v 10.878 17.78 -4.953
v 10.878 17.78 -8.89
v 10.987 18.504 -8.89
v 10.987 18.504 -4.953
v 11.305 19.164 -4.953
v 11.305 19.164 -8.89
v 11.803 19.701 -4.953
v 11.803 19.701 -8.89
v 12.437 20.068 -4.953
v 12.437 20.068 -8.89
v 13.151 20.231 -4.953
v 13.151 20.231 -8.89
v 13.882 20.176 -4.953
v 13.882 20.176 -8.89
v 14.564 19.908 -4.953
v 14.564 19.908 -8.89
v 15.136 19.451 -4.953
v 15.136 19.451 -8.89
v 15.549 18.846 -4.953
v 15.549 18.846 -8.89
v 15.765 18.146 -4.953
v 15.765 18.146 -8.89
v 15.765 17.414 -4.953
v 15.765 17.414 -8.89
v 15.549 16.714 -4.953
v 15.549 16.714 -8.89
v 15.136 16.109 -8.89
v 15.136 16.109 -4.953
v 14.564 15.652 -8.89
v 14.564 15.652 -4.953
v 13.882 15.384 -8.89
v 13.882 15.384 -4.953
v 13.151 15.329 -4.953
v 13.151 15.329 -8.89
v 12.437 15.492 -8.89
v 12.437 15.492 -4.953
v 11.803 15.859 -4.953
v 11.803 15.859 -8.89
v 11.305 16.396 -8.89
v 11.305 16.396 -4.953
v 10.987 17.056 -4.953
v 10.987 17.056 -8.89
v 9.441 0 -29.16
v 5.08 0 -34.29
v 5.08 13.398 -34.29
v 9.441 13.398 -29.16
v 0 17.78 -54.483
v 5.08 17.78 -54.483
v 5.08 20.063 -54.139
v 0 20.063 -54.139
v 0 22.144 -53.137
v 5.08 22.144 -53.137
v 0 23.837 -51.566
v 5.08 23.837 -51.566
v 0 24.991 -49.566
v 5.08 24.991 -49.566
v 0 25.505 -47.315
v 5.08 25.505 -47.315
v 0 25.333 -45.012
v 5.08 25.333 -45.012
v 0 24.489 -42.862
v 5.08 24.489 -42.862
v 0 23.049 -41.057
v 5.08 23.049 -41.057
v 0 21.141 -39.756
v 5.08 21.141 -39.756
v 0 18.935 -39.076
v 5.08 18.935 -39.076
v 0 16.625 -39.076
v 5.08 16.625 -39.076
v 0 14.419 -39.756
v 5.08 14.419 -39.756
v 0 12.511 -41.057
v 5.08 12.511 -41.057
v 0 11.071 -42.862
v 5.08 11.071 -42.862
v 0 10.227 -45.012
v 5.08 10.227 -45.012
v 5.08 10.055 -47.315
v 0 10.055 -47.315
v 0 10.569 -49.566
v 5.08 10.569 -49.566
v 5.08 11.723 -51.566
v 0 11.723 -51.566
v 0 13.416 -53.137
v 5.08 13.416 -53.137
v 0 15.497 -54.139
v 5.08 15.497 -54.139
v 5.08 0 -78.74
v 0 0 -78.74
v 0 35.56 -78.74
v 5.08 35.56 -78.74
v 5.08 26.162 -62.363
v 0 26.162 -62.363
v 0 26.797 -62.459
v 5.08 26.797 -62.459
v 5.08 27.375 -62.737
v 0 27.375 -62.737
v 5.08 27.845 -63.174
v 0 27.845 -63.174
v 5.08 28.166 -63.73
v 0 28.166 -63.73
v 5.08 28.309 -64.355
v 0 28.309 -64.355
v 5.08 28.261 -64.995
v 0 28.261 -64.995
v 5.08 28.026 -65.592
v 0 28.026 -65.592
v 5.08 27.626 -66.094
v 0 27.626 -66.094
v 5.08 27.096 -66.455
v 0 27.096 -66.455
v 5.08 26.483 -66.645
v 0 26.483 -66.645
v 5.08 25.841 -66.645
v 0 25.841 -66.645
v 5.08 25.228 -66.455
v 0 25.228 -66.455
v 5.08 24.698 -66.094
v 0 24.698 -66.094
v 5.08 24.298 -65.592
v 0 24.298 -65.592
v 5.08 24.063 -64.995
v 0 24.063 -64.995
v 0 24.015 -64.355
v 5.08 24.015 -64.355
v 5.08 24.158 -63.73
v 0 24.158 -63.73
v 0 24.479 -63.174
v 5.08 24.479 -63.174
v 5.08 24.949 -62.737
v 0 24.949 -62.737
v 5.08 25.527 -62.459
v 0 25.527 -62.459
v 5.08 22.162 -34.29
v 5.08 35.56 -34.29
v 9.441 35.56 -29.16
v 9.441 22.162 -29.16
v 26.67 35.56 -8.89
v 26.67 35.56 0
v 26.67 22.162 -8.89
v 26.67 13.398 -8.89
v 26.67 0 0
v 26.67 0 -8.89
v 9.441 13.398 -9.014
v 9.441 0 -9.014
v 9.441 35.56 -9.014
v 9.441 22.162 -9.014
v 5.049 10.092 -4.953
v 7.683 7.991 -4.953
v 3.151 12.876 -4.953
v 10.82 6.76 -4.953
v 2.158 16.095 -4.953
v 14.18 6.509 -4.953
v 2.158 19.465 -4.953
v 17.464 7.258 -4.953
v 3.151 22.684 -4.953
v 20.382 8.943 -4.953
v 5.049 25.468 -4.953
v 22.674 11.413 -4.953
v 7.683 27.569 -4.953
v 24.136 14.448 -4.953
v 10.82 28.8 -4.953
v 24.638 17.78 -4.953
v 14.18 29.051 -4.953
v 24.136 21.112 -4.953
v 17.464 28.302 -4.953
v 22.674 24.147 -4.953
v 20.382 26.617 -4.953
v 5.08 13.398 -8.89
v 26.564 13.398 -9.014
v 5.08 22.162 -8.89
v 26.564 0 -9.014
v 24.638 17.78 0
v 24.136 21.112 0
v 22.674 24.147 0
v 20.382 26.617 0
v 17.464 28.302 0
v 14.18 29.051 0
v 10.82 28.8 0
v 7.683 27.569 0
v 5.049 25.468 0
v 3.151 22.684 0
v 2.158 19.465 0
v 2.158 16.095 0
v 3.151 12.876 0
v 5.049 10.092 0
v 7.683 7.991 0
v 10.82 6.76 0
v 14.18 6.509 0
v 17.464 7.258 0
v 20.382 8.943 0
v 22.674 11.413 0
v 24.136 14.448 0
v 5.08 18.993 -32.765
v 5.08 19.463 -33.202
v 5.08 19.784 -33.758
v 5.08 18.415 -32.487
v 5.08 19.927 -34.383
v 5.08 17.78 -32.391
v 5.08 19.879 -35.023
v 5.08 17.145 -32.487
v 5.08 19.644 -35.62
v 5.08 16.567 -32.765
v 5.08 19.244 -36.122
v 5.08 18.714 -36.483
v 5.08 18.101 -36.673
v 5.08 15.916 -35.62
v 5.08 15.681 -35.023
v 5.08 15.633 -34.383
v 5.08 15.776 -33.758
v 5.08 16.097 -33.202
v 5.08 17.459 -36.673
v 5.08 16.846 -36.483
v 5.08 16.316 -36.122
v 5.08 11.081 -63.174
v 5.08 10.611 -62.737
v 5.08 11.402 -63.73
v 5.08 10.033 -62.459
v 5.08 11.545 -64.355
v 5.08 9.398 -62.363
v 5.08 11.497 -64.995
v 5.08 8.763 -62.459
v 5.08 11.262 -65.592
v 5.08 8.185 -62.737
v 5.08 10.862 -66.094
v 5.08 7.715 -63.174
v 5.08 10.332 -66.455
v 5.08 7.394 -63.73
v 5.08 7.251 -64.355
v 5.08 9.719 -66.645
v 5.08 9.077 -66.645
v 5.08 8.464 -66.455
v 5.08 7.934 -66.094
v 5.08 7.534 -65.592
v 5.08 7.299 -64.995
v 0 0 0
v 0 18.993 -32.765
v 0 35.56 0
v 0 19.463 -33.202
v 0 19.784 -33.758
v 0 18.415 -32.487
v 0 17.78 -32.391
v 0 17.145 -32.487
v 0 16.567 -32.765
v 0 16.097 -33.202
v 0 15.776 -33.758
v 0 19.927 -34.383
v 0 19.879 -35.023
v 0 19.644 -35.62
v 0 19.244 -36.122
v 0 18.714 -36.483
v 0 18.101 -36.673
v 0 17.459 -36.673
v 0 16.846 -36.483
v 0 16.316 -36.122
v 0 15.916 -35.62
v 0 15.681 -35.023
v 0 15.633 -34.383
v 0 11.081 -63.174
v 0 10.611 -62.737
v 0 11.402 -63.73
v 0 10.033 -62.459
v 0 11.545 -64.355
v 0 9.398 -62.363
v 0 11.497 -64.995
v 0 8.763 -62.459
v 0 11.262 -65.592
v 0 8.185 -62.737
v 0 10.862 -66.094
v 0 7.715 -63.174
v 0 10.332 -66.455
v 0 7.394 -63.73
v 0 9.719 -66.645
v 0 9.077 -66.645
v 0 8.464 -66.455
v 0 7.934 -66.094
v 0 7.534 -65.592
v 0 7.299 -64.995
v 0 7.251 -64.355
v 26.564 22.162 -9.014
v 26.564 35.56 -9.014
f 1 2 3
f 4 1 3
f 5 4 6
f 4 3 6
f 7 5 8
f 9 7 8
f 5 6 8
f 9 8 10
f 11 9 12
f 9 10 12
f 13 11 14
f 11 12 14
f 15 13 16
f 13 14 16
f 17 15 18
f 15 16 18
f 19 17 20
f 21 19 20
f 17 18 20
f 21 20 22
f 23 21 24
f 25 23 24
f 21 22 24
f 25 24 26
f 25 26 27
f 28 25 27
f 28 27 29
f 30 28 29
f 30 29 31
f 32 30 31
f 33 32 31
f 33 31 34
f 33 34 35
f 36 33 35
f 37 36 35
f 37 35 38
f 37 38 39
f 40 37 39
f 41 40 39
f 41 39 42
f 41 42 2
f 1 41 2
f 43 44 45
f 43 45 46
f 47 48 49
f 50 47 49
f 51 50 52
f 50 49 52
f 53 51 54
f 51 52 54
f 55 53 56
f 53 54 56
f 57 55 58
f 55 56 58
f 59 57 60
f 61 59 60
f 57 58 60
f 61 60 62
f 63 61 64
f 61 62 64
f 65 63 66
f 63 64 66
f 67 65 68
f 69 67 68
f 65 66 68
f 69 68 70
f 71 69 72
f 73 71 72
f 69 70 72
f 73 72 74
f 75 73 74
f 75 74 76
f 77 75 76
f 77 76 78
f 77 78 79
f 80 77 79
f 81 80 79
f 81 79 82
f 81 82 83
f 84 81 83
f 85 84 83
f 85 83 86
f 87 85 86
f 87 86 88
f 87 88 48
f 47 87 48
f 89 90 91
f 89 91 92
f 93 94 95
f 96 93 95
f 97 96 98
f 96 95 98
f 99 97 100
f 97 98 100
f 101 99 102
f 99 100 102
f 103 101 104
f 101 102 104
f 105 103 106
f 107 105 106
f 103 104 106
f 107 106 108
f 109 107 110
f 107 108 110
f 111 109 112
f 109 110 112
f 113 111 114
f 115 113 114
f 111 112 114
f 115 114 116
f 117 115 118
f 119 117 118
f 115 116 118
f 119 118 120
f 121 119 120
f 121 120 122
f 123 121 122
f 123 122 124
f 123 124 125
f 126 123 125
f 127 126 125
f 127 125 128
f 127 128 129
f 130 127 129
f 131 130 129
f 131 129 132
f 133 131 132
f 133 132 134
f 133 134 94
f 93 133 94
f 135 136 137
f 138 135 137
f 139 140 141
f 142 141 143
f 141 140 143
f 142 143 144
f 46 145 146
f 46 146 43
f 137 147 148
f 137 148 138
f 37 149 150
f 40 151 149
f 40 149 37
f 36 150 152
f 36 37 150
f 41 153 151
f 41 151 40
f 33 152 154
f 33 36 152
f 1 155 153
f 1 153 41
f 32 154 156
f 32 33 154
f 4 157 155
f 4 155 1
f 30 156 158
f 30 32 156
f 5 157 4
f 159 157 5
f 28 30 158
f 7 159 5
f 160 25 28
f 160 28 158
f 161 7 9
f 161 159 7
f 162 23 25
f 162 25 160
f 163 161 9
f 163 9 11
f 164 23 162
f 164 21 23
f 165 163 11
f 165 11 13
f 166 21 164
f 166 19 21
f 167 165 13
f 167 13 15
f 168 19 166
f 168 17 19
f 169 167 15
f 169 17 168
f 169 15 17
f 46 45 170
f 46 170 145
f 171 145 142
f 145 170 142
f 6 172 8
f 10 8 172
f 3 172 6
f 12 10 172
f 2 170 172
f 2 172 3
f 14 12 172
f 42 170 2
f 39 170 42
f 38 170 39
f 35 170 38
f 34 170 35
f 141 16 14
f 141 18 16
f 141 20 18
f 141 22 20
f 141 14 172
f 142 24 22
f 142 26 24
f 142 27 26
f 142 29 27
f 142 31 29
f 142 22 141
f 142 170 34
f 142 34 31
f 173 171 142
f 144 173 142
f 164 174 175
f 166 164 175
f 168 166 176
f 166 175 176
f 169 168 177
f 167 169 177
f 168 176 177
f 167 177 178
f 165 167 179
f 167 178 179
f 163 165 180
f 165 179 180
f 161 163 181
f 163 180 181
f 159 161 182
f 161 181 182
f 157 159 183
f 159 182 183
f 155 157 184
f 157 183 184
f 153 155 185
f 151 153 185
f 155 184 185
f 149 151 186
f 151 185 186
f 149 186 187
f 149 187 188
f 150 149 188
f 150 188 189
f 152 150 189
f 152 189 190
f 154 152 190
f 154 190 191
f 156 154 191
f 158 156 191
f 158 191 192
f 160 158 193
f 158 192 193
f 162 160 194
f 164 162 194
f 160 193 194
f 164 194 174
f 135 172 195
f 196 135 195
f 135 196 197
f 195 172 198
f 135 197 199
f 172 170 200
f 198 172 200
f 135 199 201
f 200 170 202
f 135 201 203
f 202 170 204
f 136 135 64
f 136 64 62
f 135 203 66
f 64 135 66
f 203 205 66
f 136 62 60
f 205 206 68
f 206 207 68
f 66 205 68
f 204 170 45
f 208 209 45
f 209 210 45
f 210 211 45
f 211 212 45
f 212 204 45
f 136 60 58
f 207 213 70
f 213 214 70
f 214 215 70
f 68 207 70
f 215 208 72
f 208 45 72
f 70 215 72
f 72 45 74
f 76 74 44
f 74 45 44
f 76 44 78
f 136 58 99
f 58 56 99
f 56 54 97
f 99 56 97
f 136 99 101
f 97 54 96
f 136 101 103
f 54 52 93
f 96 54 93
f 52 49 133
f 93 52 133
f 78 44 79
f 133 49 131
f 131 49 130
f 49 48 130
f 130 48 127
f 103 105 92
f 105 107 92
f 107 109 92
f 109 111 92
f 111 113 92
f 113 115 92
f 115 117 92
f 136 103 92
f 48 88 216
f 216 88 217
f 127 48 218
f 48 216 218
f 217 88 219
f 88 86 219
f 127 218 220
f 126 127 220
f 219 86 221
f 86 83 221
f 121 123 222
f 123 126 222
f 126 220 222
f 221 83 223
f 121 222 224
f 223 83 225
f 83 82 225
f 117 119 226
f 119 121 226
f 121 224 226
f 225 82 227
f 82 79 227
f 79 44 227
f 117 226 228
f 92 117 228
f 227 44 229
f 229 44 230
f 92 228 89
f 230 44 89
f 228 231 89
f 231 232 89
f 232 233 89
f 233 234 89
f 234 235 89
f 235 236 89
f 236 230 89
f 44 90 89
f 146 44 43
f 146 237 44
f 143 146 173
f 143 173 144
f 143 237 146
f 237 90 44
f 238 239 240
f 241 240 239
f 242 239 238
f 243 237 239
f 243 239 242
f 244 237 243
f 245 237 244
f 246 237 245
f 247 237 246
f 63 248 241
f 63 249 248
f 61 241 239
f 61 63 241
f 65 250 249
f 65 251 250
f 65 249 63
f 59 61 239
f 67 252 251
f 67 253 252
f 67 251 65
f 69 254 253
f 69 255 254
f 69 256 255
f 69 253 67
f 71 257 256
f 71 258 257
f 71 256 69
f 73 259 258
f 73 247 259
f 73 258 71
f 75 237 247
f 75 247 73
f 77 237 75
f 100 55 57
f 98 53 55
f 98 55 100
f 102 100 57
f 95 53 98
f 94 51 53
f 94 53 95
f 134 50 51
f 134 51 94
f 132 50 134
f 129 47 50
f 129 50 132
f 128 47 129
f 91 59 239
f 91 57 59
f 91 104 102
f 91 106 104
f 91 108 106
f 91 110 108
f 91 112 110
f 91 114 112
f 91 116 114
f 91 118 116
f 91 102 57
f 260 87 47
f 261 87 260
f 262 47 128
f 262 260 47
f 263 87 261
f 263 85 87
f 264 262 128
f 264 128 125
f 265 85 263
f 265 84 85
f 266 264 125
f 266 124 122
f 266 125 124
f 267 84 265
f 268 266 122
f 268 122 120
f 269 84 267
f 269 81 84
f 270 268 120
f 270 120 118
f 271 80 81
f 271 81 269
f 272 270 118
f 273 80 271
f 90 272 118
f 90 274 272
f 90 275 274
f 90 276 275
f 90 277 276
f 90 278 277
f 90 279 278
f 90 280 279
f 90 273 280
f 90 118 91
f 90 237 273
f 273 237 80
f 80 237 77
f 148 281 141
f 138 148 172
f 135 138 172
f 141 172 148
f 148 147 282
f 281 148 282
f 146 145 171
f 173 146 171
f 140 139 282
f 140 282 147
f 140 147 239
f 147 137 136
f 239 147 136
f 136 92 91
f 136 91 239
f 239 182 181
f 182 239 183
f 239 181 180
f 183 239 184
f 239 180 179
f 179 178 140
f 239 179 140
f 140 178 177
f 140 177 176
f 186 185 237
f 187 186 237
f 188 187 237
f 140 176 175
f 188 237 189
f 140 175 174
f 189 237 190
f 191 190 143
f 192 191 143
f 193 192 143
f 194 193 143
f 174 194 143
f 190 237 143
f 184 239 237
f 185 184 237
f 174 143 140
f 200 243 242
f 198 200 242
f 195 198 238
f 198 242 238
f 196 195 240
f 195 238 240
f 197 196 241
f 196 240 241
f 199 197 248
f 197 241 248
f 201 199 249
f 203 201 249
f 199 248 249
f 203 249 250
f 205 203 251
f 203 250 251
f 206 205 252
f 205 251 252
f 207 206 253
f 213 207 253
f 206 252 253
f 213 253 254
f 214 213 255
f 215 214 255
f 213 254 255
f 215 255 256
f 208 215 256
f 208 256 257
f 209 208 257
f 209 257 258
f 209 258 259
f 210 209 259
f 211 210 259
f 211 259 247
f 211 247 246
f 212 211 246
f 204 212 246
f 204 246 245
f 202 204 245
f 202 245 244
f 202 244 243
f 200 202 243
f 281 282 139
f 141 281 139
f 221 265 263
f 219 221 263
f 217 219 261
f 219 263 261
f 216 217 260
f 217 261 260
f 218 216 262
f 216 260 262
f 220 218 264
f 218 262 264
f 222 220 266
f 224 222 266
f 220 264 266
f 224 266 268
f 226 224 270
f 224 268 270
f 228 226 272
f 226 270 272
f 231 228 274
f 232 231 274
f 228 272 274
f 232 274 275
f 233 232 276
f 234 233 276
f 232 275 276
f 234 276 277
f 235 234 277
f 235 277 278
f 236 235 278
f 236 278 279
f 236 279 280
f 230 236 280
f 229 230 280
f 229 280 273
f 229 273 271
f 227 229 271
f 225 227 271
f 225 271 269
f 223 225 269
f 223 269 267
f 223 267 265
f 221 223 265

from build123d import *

# Parameters (mm, degrees)
SKETCH1_W                 = 5.08
SKETCH1_H                 = 78.74
SKETCH1_W_2               = 21.59
SKETCH1_H_2               = 8.89
BOSS_EXTRUDE1_DEPTH       = 35.56
SKETCH2_R                 = 11.303
CUT_EXTRUDE1_DEPTH        = 4.953
F_8_CLEARANCE_HOLE1_D     = 4.9149
CUT_EXTRUDE4_REACH        = 91.054
SKETCH5_R                 = 7.747
F_6_CLEARANCE_HOLE1_D     = 4.3053
F_6_CLEARANCE_HOLE1_DEPTH = 5.08
BOSS_EXTRUDE3_DEPTH       = 13.3985
BOSS_EXTRUDE4_DEPTH       = 13.3985
SKETCH21_R                = 38.1
CUT_EXTRUDE5_DEPTH        = 91.420075758
SKETCH22_W                = 17.828699099
SKETCH22_H                = 30.684129503
CUT_EXTRUDE6_DEPTH        = 121.92


with BuildPart() as part:
    # Sketch1 → Boss-Extrude1 (new body)
    with BuildSketch(Plane(origin=(0, 0, 0), x_dir=(1, 0, 0), z_dir=(0, 1, 0))):
        with Locations((2.54, 39.37)):
            Rectangle(SKETCH1_W, SKETCH1_H)
        with Locations((15.875, 4.445)):
            Rectangle(SKETCH1_W_2, SKETCH1_H_2)
    extrude(amount=BOSS_EXTRUDE1_DEPTH)

    # Sketch2 → Cut-Extrude1 (cut)
    with BuildSketch(Plane.XY):
        with Locations((13.335, 17.78)):
            Circle(SKETCH2_R)
    extrude(amount=-CUT_EXTRUDE1_DEPTH, mode=Mode.SUBTRACT)

    # #8 Clearance Hole1 (through all)
    with Locations(Plane.XY.offset(-4.953)):
        with Locations((13.335, 17.78)):
            Hole(F_8_CLEARANCE_HOLE1_D / 2)

    # Sketch5 → Cut-Extrude4 (cut, up to next)
    with BuildSketch(Plane(origin=(5.08, 0, 0), x_dir=(0, 0, -1), z_dir=(1, 0, 0)), mode=Mode.PRIVATE) as cut_extrude4_sk1:
        with Locations((46.736, 17.78)):
            Circle(SKETCH5_R)
    cut_extrude4_tool1 = extrude(cut_extrude4_sk1.sketch, amount=-CUT_EXTRUDE4_REACH, mode=Mode.PRIVATE) & part.part
    # Sketch5 → Cut-Extrude4 (cut, up to next)
    with BuildSketch(Plane(origin=(5.08, 0, 0), x_dir=(0, 0, -1), z_dir=(1, 0, 0)), mode=Mode.PRIVATE) as cut_extrude4_sk2:
        with BuildLine():
            ThreePointArc((54.483, 17.78), (46.736, 25.527), (38.989, 17.78))
            Line((38.989, 17.78), (54.483, 17.78))
        make_face()
    cut_extrude4_tool2 = extrude(cut_extrude4_sk2.sketch, amount=-CUT_EXTRUDE4_REACH, mode=Mode.PRIVATE) & part.part
    # Sketch5 → Cut-Extrude4 (cut, up to next)
    with BuildSketch(Plane(origin=(5.08, 0, 0), x_dir=(0, 0, -1), z_dir=(1, 0, 0)), mode=Mode.PRIVATE) as cut_extrude4_sk3:
        with BuildLine():
            Line((54.483, 17.78), (38.989, 17.78))
            ThreePointArc((38.989, 17.78), (46.736, 10.033), (54.483, 17.78))
        make_face()
    cut_extrude4_tool3 = extrude(cut_extrude4_sk3.sketch, amount=-CUT_EXTRUDE4_REACH, mode=Mode.PRIVATE) & part.part
    add(cut_extrude4_tool1.solids().sort_by_distance((5.08, 17.78, -46.736))[0], mode=Mode.SUBTRACT)
    add(cut_extrude4_tool2.solids().sort_by_distance((5.08, 21.067929, -46.736))[0], mode=Mode.SUBTRACT)
    add(cut_extrude4_tool3.solids().sort_by_distance((5.08, 14.492071, -46.736))[0], mode=Mode.SUBTRACT)

    # #6 Clearance Hole1
    with Locations(Plane(origin=(5.08, 0, 0), x_dir=(0, 0, -1), z_dir=(1, 0, 0))):
        with Locations((34.544, 17.78), (46.736, 17.78), (64.516, 26.162), (64.516, 9.398)):
            Hole(F_6_CLEARANCE_HOLE1_D / 2, depth=F_6_CLEARANCE_HOLE1_DEPTH)

    # Sketch17 → Boss-Extrude3 (add)
    with BuildSketch(Plane(origin=(0, 35.56, 0), x_dir=(1, 0, 0), z_dir=(0, 1, 0))):
        Polygon((5.08, 8.89), (5.08, 34.29), (26.67, 8.89), align=None)
    extrude(amount=-BOSS_EXTRUDE3_DEPTH)

    # Sketch18 → Boss-Extrude4 (add)
    with BuildSketch(Plane.XZ):
        Polygon((26.67, -8.89), (5.08, -8.89), (5.08, -34.29), align=None)
    extrude(amount=-BOSS_EXTRUDE4_DEPTH)

    # Sketch21 → Cut-Extrude5 (cut, through all)
    with BuildSketch(Plane(origin=(0, 35.56, 0), x_dir=(1, 0, 0), z_dir=(0, 1, 0))):
        with Locations((44.937862921, 45.023006442)):
            Circle(SKETCH21_R)
    extrude(amount=-CUT_EXTRUDE5_DEPTH, mode=Mode.SUBTRACT)

    # Sketch22 → Cut-Extrude6 (cut)
    with BuildSketch(Plane(origin=(0, 35.56, 0), x_dir=(1, 0, 0), z_dir=(0, 1, 0))):
        with Locations((18.355186326, 24.356358653)):
            Rectangle(SKETCH22_W, SKETCH22_H)
    extrude(amount=-CUT_EXTRUDE6_DEPTH, mode=Mode.SUBTRACT)


solid = part.part
